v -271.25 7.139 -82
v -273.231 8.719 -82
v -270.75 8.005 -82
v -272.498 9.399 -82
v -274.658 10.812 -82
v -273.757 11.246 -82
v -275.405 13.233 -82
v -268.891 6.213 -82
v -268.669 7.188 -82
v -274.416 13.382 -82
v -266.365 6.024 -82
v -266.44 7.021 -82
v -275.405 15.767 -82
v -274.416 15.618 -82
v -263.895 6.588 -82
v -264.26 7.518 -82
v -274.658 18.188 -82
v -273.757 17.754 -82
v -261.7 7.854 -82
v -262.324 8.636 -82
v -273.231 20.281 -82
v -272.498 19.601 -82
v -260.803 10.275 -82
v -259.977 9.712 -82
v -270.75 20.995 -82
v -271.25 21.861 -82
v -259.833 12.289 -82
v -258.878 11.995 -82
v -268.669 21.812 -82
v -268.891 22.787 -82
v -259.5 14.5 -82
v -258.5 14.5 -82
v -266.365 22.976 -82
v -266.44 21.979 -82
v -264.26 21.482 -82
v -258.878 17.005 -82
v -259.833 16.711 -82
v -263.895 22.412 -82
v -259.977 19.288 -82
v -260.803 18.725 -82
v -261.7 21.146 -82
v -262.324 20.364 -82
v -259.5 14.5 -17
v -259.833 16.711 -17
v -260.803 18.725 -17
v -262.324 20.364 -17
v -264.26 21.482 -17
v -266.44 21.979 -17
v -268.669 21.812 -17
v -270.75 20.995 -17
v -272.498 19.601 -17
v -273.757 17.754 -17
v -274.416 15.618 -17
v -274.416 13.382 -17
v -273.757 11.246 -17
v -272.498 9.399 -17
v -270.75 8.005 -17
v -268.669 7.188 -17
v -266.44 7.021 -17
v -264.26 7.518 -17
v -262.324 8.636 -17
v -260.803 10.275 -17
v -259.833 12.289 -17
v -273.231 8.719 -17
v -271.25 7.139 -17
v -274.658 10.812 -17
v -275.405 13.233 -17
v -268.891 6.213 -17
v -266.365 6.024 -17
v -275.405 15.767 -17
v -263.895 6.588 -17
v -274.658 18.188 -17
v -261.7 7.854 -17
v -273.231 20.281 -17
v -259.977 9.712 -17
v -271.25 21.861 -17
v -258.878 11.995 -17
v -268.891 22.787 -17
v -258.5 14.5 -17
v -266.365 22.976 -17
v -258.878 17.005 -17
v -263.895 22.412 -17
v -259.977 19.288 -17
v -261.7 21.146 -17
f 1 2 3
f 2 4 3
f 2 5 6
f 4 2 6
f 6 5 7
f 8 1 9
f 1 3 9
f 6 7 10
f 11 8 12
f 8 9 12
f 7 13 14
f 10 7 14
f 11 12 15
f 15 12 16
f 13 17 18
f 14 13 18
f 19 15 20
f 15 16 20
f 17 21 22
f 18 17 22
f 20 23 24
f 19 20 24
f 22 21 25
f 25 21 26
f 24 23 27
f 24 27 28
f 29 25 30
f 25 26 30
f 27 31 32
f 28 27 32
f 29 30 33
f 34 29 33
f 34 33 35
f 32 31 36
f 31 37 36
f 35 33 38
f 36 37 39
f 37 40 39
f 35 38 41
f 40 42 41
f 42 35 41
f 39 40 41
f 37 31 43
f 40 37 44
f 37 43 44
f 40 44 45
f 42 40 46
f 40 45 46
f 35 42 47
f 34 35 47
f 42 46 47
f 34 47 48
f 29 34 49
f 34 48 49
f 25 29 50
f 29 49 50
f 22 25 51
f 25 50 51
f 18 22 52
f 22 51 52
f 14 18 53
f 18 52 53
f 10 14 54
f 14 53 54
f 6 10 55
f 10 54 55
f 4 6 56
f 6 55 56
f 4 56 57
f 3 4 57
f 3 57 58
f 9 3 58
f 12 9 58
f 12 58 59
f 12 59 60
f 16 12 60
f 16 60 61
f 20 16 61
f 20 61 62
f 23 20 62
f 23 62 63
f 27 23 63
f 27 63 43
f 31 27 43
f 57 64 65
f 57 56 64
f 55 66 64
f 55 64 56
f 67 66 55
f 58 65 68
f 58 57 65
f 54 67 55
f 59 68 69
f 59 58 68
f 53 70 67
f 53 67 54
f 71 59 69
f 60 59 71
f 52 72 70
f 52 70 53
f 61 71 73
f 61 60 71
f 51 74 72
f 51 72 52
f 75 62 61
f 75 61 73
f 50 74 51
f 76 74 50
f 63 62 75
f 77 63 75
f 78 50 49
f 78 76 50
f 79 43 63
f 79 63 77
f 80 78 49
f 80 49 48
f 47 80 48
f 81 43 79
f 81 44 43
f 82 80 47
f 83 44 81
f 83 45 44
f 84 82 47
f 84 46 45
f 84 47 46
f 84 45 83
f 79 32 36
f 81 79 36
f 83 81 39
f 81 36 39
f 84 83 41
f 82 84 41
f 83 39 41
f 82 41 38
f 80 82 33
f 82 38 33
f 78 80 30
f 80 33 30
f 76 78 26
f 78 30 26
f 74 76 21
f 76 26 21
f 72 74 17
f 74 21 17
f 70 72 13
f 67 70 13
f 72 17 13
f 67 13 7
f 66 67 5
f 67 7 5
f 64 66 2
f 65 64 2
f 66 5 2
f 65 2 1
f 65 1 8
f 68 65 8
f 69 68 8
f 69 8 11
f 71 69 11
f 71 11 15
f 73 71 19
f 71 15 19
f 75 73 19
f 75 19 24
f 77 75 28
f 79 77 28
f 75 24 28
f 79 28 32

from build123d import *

# Parameters (mm, degrees)
SKETCH020_R     = 8.5
PAD013_DEPTH    = 65
SKETCH022_R     = 7.5
POCKET001_DEPTH = 85
SKETCH_R        = 7
POCKET_DEPTH    = 70


with BuildPart() as part:
    # Sketch020 → Pad013 (new body)
    with BuildSketch(Plane.XY):
        Circle(SKETCH020_R)
    extrude(amount=PAD013_DEPTH)

    # Sketch022 (on Face3 of Pad013) → Pocket001 (cut)
    with BuildSketch(Plane.XY.offset(65)):
        Circle(SKETCH022_R)
    extrude(amount=-POCKET001_DEPTH, mode=Mode.SUBTRACT)

    # Sketch (on Face3 of Pad013) → Pocket (cut)
    with BuildSketch(Plane.XY.offset(65)):
        Circle(SKETCH_R)
    extrude(amount=-POCKET_DEPTH, mode=Mode.SUBTRACT)


with BuildPart() as part_1:
    # Body009 placement: moved
    add(part.part.moved(Location((-267, 14.5, -82))))


solid = part_1.part
